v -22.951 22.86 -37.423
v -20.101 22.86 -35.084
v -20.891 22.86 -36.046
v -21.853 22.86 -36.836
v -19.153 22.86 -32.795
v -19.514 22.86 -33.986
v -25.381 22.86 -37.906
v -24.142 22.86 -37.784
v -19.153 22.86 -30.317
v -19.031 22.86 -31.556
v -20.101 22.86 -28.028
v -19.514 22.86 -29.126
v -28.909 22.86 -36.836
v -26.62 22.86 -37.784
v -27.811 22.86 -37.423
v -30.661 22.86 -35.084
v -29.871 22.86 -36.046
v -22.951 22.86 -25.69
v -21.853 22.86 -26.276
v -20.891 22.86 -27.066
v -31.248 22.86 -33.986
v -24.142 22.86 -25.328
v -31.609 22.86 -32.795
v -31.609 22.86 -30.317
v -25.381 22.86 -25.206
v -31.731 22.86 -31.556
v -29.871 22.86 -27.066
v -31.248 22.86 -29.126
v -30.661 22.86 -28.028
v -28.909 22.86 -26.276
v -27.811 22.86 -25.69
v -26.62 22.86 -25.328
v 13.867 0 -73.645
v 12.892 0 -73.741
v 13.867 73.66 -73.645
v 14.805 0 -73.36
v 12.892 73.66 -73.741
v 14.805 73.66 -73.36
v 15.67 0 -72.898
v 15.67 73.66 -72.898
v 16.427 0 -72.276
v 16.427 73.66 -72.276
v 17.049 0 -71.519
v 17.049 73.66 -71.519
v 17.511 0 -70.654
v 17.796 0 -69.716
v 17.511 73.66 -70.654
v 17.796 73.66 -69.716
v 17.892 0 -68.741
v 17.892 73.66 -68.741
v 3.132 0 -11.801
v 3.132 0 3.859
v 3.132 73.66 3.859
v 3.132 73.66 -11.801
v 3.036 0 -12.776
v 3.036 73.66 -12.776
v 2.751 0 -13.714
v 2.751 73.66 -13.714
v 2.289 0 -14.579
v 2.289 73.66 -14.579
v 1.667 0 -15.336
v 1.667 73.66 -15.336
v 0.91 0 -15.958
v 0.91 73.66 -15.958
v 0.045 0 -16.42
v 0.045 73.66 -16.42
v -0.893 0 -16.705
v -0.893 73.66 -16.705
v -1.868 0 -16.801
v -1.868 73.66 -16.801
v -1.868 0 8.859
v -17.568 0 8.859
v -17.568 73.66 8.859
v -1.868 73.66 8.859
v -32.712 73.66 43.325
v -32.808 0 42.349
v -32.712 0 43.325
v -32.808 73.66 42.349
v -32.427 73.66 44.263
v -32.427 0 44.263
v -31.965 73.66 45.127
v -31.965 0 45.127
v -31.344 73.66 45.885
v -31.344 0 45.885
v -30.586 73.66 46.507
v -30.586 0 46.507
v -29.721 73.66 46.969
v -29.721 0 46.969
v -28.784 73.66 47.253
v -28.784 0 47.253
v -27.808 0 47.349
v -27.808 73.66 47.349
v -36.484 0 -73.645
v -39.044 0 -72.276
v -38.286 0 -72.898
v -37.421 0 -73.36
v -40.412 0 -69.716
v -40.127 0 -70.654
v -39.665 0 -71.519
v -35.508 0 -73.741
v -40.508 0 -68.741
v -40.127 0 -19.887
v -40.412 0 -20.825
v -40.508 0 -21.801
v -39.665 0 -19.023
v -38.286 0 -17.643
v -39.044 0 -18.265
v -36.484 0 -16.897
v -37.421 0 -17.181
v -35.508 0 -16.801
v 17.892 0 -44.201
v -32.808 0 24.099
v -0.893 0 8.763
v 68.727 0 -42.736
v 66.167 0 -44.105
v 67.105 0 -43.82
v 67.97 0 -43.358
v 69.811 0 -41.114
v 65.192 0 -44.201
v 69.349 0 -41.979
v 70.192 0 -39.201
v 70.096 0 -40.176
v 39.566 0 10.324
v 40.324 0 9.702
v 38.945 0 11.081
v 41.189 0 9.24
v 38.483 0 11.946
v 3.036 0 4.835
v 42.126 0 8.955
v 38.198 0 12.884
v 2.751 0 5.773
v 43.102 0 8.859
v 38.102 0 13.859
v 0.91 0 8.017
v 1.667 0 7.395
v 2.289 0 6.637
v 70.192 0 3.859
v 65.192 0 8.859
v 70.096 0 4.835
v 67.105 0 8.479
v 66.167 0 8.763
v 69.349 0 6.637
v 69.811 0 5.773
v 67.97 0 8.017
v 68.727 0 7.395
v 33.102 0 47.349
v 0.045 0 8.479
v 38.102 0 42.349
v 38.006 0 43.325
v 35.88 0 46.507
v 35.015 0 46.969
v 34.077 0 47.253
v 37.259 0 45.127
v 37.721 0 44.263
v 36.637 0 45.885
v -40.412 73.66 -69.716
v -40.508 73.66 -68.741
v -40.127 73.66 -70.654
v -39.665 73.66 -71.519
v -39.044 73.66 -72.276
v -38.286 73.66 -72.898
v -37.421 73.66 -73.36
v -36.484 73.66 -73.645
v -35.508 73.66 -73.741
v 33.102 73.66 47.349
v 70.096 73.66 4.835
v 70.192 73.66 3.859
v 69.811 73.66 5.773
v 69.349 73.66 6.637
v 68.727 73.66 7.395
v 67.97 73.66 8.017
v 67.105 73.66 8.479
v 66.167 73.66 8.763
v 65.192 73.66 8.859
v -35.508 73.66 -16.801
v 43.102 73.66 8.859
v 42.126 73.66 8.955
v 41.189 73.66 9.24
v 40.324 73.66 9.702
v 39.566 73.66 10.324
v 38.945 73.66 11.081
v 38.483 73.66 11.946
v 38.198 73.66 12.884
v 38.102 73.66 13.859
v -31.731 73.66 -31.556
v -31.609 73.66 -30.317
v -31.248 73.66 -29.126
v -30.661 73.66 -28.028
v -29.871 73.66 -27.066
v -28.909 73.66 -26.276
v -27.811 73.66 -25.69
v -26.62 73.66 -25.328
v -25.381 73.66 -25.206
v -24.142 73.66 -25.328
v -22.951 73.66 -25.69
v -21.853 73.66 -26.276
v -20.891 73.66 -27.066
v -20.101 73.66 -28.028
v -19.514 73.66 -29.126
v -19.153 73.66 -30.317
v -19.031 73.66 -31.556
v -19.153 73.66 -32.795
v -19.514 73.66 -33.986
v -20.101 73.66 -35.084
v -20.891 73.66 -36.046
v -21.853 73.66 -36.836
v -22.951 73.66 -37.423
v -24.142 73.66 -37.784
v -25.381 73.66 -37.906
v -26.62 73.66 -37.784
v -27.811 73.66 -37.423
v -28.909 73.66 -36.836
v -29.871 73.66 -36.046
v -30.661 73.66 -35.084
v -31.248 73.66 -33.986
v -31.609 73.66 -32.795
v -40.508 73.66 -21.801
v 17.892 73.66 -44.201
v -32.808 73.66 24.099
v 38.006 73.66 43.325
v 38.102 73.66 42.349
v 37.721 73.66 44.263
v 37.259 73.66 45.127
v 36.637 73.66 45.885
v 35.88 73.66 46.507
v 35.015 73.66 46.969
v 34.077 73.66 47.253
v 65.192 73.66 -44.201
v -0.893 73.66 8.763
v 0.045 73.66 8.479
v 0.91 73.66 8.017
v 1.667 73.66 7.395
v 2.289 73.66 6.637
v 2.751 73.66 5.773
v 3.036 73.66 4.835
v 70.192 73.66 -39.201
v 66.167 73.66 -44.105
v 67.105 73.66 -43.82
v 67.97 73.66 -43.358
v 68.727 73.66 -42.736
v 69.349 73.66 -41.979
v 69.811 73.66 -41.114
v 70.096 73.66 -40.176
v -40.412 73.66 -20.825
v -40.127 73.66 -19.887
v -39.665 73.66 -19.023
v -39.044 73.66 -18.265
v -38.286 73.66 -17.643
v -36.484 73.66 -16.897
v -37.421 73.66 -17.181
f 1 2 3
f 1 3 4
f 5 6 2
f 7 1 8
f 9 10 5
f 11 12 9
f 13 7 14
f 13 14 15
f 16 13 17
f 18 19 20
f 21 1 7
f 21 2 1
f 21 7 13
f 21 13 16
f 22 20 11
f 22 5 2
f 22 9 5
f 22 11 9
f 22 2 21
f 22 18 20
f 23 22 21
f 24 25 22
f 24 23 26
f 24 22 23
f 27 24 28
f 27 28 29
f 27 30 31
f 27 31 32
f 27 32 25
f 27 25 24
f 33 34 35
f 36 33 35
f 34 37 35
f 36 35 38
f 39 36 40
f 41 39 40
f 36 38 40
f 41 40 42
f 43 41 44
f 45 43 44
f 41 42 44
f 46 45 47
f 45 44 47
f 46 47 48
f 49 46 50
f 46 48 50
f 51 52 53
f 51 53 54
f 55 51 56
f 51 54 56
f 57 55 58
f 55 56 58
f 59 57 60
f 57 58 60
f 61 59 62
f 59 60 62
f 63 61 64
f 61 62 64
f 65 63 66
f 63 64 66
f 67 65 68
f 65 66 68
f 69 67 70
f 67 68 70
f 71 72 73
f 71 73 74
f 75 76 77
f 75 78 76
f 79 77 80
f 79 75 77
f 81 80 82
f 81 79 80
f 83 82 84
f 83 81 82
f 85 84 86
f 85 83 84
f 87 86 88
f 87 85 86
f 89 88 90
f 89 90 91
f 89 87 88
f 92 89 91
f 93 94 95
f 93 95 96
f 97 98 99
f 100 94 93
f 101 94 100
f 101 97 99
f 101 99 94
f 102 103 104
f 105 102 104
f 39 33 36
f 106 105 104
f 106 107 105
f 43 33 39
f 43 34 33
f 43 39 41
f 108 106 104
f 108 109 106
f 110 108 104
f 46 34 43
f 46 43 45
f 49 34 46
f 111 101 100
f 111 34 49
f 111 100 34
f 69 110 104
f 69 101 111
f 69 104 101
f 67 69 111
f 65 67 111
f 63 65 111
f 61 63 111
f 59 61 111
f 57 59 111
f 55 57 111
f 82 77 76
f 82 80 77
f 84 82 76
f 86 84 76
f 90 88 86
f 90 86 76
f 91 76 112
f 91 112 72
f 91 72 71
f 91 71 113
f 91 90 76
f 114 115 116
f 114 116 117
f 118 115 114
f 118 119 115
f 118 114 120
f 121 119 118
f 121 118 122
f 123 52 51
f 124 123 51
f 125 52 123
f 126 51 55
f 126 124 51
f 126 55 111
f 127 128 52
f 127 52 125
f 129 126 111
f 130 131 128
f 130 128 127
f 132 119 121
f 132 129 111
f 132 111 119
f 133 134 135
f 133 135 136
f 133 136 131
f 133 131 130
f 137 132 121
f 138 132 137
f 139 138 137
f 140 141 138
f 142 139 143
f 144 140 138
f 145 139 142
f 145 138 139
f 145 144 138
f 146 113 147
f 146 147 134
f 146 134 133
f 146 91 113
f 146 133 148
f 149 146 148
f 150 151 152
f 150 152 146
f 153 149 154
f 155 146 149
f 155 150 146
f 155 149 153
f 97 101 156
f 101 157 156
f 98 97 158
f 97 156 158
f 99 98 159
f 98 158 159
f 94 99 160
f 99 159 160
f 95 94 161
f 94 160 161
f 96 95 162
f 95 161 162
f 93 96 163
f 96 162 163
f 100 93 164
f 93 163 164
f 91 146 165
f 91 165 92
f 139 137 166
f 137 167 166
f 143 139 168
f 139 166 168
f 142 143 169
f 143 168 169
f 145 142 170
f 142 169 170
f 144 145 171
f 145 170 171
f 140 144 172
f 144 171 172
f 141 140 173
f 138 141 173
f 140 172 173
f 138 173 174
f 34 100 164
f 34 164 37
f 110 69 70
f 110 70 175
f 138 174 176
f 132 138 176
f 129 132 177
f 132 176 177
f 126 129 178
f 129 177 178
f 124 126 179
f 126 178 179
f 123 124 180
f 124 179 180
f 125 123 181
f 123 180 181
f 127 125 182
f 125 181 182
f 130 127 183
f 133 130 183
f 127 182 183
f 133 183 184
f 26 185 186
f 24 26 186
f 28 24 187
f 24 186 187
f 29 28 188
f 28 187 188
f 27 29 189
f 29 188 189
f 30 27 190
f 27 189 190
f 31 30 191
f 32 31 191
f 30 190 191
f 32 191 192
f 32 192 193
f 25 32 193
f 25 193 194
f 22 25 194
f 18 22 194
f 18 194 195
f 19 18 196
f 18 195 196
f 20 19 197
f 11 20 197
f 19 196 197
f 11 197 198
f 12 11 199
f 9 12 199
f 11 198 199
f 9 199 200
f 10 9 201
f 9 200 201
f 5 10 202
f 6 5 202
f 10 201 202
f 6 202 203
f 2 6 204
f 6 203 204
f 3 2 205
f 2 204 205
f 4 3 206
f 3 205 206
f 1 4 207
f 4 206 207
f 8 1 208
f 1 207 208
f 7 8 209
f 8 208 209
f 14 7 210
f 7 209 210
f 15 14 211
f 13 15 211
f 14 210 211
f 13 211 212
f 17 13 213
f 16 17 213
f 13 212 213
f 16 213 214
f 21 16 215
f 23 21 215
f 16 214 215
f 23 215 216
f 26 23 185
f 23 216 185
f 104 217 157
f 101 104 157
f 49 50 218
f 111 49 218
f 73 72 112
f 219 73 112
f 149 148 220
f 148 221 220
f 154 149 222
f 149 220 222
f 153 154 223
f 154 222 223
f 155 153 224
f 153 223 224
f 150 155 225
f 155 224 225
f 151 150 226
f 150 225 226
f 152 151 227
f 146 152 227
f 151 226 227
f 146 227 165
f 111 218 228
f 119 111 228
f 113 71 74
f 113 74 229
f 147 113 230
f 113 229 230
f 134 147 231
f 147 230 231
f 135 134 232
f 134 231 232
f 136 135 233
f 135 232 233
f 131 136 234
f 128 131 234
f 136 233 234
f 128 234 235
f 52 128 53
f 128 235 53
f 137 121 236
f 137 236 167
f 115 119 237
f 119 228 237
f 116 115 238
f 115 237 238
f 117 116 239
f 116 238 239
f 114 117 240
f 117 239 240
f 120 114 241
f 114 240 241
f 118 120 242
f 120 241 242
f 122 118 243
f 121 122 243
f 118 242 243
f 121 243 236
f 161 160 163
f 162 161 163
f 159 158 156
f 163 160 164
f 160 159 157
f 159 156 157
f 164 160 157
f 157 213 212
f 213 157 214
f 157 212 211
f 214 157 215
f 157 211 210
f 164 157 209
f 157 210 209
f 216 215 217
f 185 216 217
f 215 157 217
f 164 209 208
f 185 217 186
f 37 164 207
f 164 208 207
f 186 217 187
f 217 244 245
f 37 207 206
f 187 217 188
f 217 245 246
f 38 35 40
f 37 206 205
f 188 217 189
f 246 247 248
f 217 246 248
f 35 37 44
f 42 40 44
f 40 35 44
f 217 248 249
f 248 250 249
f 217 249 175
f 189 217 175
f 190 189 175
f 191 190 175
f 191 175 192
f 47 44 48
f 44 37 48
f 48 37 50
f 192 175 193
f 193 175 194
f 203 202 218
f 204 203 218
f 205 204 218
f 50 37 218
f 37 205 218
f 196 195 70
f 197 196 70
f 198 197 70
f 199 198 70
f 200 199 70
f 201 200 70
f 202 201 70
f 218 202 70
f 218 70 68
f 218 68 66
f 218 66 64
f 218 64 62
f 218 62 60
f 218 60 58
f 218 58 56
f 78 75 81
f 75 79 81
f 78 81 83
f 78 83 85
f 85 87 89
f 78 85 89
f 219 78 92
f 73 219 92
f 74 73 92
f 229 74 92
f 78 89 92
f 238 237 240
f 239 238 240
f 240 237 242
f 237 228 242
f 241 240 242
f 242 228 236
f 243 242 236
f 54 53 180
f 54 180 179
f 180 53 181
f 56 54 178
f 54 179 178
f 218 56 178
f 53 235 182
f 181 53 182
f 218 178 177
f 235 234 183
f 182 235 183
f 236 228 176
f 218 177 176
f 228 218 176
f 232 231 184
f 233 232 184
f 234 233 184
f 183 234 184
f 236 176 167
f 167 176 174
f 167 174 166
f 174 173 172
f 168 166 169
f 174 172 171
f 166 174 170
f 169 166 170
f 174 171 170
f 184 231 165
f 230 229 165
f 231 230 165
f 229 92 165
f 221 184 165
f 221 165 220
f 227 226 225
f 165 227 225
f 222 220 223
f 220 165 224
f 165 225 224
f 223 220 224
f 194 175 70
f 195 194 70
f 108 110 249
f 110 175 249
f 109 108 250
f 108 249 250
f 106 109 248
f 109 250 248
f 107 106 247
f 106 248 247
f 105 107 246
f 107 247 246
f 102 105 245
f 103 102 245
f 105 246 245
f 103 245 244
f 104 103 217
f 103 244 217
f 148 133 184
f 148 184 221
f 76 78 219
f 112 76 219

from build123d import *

# Parameters (mm, degrees)
F1_DEPTH = 73.66
F2_R     = 5
F4_DEPTH = 73.661
F5_R     = 6.35
F6_DEPTH = 50.8


with BuildPart() as f1:
    # F0 (on Front) → F1 (new body)
    with BuildSketch(Plane.XZ):
        Polygon((-32.808065, 47.349315), (-32.808065, 8.859315), (3.131935, 8.859315), (3.131935, -16.800685), (-40.508065, -16.800685), (-40.508065, -73.740685), (17.891935, -73.740685), (17.891935, -44.200685), (70.191935, -44.200685), (70.191935, 8.859315), (38.101935, 8.859315), (38.101935, 47.349315), align=None)
    extrude(amount=-F1_DEPTH)

    # F2
    f2_edges = [f1.edges().sort_by_distance(p)[0] for p in [
        (38.101935, 36.83, 47.349315),
        (-32.808065, 36.83, 47.349315),
        (38.101935, 36.83, 8.859315),
        (70.191935, 36.83, 8.859315),
        (70.191935, 36.83, -44.200685),
        (17.891935, 36.83, -73.740685),
        (-40.508065, 36.83, -73.740685),
        (-40.508065, 36.83, -16.800685),
        (3.131935, 36.83, -16.800685),
        (3.131935, 36.83, 8.859315),
    ]]
    fillet(f2_edges, radius=F2_R)

    # F3 (on face) → F4 (cut, through all)
    with BuildSketch(Plane.XZ):
        Polygon((-32.808065, 24.099315), (-32.808065, 8.859315), (-17.568065, 8.859315), align=None)
    extrude(amount=-F4_DEPTH, mode=Mode.SUBTRACT)

    # F5 (on face) → F6 (cut)
    with BuildSketch(Plane(origin=(0, 73.66, 0), x_dir=(-1, 0, 0), z_dir=(0, 1, 0))):
        with Locations((25.380932, -31.556167)):
            Circle(F5_R)
    extrude(amount=-F6_DEPTH, mode=Mode.SUBTRACT)


solid = f1.part
